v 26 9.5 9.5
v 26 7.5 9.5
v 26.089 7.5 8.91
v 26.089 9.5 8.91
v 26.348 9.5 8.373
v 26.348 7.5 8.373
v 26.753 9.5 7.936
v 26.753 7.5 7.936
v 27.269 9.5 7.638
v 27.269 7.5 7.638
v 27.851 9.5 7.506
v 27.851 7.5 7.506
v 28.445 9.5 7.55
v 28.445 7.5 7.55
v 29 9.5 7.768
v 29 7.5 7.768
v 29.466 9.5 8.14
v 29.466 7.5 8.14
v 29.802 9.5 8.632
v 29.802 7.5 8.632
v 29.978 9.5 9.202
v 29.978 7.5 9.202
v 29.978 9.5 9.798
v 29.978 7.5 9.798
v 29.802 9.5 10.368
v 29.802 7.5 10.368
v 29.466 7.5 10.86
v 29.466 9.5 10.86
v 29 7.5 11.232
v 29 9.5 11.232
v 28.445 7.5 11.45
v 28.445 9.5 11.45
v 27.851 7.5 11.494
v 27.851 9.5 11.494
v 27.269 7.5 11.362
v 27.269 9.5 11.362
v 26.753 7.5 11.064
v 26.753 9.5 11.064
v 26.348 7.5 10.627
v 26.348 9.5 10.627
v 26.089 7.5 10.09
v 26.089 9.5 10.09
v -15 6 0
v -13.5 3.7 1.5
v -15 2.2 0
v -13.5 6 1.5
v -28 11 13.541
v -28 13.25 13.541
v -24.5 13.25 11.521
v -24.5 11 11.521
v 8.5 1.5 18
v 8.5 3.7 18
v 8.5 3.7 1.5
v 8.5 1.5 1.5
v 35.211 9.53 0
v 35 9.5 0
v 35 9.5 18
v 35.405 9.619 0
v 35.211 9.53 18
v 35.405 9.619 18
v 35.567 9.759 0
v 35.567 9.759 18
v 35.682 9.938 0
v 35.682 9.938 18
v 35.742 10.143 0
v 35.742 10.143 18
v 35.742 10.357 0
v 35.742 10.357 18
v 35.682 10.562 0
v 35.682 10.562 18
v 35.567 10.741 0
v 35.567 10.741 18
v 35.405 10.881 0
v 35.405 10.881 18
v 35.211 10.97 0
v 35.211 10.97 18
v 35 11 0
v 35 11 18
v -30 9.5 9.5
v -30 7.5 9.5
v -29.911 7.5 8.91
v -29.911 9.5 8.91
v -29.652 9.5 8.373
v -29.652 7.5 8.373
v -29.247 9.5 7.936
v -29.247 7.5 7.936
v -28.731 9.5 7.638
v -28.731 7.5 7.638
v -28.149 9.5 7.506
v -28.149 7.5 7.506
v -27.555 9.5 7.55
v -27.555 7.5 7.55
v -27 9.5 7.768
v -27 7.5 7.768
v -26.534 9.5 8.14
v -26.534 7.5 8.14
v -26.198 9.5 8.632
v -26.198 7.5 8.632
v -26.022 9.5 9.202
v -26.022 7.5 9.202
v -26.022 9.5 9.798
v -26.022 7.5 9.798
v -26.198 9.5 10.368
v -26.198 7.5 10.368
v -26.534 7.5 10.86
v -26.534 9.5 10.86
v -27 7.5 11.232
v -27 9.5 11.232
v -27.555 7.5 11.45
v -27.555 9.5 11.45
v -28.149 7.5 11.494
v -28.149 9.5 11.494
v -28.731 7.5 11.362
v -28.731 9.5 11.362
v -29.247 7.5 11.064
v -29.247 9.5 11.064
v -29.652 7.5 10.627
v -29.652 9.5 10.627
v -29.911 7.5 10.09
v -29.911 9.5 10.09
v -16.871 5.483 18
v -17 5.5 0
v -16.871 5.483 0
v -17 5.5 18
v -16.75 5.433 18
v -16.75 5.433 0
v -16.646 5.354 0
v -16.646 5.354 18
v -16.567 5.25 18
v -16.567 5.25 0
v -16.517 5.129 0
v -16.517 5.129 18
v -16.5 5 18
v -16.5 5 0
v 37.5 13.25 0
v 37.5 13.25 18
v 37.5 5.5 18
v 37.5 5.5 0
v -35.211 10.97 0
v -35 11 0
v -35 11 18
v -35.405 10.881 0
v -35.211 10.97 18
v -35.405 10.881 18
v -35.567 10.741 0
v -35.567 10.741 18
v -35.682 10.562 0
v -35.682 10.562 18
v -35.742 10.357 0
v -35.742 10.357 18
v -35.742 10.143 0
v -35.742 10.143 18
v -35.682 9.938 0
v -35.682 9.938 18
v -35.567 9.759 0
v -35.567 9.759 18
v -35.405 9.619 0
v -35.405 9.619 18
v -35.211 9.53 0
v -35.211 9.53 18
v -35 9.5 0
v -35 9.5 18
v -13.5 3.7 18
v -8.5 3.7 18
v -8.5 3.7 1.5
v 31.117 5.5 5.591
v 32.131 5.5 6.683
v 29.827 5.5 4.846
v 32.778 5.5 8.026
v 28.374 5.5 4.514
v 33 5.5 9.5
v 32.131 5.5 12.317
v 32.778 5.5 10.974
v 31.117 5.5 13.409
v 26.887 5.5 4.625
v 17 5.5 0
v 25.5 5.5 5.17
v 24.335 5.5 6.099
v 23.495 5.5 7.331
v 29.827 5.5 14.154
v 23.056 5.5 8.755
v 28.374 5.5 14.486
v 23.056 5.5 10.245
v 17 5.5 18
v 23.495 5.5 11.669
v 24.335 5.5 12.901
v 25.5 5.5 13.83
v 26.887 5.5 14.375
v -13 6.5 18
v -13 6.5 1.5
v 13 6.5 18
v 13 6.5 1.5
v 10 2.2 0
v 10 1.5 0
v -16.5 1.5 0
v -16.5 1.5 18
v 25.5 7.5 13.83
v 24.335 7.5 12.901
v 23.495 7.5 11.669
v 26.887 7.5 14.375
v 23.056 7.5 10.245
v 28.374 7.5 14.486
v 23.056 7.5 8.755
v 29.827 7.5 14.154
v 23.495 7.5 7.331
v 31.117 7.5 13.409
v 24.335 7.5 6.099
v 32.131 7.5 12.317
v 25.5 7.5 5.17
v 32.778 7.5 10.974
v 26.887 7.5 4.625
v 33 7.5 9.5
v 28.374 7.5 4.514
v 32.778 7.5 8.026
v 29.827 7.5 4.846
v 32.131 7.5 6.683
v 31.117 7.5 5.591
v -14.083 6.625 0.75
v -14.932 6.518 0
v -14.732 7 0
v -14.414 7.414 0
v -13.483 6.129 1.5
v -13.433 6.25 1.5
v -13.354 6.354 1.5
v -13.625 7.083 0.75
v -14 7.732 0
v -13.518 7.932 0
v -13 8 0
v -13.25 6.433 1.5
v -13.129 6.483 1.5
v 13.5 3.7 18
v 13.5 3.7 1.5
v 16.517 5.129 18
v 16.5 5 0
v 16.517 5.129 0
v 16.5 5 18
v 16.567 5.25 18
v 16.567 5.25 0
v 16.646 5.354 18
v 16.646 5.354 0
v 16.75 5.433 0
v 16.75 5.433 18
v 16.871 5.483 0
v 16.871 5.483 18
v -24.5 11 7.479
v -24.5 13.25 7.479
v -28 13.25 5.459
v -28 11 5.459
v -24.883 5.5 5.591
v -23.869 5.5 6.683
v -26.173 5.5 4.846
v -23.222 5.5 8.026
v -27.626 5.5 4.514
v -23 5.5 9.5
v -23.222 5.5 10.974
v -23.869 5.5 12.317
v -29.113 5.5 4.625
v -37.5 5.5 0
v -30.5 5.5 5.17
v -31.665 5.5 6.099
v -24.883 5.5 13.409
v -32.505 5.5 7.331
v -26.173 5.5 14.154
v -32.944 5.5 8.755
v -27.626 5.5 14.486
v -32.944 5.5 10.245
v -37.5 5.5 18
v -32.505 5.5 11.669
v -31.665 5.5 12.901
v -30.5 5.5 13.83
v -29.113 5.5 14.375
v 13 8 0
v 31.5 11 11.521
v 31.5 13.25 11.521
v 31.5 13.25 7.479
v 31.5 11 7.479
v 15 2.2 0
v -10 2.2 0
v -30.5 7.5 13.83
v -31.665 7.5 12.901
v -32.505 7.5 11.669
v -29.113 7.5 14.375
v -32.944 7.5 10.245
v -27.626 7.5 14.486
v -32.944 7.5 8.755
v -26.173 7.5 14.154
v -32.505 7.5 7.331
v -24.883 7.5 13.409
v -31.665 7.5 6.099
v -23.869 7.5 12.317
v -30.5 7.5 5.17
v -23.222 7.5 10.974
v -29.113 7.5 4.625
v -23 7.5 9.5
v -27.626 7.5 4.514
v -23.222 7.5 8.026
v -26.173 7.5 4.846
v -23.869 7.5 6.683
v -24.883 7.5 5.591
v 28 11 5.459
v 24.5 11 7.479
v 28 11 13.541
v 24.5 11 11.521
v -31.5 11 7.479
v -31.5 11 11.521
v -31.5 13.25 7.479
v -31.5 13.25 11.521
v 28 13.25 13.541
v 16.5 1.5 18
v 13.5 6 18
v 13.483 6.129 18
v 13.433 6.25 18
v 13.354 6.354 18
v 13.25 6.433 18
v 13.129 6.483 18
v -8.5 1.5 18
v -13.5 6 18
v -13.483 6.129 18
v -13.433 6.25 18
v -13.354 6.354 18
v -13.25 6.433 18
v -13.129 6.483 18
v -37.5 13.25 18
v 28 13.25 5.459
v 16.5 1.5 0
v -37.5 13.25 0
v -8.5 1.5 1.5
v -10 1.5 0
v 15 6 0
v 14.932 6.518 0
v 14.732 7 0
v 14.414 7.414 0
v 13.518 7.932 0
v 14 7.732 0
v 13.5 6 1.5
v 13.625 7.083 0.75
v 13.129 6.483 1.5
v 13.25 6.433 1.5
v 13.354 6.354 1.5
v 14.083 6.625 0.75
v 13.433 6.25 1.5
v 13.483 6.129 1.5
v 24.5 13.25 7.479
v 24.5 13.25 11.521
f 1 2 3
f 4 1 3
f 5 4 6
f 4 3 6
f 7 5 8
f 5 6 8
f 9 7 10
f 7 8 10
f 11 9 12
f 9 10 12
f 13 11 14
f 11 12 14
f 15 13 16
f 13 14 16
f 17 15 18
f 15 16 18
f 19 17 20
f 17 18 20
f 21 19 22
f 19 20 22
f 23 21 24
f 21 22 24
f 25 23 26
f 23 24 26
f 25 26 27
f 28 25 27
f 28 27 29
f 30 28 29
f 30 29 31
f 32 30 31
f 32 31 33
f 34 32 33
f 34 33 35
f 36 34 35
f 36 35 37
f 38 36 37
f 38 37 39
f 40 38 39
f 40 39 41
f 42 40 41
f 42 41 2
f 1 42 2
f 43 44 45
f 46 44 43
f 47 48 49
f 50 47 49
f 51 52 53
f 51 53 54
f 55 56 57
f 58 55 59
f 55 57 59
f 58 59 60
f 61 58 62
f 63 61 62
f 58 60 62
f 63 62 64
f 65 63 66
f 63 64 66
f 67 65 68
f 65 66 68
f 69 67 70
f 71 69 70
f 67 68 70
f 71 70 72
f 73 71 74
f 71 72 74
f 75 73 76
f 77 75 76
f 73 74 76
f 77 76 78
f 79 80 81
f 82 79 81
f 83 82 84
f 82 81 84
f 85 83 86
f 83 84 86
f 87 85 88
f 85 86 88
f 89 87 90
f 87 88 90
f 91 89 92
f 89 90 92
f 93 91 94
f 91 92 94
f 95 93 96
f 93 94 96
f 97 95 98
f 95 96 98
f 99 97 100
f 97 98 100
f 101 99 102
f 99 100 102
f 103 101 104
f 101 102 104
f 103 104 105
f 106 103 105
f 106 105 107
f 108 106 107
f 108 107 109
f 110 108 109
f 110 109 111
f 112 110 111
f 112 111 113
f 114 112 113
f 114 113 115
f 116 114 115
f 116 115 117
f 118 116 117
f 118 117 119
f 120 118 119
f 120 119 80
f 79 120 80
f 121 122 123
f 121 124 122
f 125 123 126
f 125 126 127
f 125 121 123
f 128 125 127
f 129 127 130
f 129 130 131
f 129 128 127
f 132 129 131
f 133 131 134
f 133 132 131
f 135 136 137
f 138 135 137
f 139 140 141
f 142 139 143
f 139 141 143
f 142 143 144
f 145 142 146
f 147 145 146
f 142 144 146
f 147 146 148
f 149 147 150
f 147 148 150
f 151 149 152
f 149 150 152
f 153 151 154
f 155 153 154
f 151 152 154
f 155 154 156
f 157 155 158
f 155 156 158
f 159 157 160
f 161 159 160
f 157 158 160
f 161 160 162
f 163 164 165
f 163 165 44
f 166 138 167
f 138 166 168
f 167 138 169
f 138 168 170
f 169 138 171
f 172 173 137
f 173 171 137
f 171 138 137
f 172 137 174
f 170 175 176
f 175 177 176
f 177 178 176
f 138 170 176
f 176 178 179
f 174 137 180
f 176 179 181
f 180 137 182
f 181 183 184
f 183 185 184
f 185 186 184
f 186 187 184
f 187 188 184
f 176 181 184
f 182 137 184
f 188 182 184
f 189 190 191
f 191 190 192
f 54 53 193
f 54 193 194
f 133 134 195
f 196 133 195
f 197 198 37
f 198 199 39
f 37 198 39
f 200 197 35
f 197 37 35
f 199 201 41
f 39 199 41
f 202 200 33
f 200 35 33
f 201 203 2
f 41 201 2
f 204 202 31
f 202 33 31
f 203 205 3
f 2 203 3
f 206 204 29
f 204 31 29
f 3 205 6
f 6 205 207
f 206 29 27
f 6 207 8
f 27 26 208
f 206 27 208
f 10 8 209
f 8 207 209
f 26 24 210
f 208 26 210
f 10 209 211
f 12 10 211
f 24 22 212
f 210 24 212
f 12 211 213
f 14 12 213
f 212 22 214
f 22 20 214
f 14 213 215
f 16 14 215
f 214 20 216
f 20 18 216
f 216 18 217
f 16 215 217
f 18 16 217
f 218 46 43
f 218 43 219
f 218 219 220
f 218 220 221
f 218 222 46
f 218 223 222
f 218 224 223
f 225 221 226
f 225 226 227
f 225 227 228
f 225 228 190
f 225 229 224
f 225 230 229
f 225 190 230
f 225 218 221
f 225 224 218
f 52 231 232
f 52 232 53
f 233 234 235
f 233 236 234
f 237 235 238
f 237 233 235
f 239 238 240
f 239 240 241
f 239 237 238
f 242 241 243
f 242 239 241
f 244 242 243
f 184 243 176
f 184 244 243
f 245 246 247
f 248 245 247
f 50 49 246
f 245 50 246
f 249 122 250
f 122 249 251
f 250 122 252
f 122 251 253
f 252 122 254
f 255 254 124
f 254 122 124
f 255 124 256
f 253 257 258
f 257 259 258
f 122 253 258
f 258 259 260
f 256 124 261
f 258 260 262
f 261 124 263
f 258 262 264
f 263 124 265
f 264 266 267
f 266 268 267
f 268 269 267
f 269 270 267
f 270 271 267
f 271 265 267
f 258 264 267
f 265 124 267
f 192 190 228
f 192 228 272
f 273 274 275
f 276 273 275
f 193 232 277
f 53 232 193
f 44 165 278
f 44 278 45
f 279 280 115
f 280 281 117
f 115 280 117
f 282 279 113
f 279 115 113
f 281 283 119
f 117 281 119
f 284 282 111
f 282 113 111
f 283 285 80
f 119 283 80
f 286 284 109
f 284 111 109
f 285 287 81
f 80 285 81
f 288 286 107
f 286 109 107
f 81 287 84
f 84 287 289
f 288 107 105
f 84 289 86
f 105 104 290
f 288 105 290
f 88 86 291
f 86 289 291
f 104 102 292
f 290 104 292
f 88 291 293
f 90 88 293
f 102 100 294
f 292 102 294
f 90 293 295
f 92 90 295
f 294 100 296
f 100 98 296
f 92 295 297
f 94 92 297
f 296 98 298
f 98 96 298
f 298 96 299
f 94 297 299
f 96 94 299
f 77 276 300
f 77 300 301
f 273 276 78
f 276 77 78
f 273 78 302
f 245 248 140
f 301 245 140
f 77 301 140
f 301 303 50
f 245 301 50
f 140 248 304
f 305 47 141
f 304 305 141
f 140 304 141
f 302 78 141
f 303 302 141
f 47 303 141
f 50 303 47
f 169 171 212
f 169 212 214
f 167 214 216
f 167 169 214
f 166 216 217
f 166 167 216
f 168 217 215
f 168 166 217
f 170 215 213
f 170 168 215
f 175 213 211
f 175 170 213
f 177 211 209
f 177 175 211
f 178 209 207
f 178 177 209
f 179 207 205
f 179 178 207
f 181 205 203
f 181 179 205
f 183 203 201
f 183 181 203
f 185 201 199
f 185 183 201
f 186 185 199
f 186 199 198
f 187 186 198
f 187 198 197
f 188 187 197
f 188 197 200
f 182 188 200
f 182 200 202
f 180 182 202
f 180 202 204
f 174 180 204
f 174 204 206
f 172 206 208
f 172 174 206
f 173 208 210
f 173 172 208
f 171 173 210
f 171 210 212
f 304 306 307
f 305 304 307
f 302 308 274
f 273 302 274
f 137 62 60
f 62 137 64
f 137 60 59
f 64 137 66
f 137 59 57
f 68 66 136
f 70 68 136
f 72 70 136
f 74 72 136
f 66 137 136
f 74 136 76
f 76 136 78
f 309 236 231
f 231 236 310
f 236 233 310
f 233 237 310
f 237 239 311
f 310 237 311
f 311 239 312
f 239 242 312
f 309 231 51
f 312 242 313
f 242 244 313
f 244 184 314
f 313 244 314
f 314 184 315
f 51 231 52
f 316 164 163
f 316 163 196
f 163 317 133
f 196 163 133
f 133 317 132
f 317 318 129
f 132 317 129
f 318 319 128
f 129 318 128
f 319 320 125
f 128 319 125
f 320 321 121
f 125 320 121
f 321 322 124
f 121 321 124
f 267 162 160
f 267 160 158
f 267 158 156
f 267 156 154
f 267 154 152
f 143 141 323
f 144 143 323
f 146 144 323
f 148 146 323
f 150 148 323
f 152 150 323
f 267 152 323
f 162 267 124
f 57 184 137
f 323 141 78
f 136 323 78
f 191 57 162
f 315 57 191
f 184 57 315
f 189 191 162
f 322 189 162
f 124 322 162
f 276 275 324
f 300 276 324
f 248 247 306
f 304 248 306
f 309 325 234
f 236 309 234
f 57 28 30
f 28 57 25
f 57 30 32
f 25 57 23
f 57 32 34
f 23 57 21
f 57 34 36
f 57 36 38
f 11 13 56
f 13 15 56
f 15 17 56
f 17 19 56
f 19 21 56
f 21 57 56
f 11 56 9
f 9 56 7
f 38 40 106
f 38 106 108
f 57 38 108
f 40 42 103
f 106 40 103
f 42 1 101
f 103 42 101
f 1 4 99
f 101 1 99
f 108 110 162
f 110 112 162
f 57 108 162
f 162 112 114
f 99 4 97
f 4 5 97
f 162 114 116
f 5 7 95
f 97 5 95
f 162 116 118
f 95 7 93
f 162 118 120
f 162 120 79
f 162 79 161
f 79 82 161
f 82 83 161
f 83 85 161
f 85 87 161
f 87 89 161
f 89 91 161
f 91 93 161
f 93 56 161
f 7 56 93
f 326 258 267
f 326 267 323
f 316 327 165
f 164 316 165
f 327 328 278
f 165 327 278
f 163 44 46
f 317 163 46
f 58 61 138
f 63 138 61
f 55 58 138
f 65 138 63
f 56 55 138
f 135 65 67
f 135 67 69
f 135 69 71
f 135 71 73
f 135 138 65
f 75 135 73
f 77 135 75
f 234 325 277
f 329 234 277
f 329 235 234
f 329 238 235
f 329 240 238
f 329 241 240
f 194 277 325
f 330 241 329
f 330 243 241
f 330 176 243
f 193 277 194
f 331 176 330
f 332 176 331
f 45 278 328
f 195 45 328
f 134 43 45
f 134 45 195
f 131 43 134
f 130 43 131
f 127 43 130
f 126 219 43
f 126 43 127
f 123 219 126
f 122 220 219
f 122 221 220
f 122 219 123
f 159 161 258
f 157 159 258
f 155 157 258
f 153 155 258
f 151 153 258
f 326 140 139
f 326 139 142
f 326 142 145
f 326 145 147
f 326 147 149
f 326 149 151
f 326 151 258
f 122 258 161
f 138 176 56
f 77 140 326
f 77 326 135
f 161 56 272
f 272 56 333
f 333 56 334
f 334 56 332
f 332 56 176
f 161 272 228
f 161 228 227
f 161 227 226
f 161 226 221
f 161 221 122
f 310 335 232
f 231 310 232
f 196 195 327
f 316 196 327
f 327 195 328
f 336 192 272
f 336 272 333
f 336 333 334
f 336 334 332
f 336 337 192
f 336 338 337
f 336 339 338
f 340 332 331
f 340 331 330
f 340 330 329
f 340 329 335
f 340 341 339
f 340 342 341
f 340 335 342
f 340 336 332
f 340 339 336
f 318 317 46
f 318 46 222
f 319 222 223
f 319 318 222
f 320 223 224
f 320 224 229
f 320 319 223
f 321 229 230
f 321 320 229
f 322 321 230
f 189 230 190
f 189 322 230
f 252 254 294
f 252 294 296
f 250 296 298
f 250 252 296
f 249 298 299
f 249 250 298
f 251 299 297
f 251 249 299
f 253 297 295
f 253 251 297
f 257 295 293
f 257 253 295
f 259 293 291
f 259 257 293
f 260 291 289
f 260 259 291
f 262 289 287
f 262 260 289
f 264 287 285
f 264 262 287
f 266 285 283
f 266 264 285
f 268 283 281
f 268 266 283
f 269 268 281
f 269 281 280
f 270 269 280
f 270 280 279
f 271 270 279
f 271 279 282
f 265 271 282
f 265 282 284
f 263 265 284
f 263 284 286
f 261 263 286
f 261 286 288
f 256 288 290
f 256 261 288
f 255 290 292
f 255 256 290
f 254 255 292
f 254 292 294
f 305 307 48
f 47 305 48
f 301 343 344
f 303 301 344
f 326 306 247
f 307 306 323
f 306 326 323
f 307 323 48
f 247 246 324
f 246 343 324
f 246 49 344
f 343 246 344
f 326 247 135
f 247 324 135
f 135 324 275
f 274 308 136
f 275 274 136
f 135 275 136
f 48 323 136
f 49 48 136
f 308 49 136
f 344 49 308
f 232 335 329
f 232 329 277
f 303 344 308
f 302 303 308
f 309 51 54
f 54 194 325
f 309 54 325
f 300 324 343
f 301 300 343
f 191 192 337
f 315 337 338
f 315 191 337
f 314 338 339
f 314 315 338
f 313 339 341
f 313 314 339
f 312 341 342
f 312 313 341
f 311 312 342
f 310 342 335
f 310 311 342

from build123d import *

# Parameters (mm, degrees)
DODANIE_WYCI_GNI_CIE1_DEPTH = 18
WYTNIJ_WYCI_GNI_CIE1_START  = -4
SZKIC4_R                    = 5
WYTNIJ_WYCI_GNI_CIE1_DEPTH  = 2
SZKIC5_R                    = 2
WYTNIJ_WYCI_GNI_CIE2_DEPTH  = 2.653427208
ZAOKR_GLENIE1_R             = 0.5
DODANIE_WYCI_GNI_CIE2_DEPTH = 18
WYTNIJ_WYCI_GNI_CIE3_REACH  = 13.75
SFAZOWANIE1_SIZE            = 1.5


with BuildPart() as part:
    # Szkic1 → Dodanie-wyciągnięcie1 (new body)
    with BuildSketch(Plane.XY):
        Polygon((-13.5, 3.7), (-13.5, 6.5), (13.5, 6.5), (13.5, 3.7), (8.5, 3.7), (8.5, 1.5), (16.5, 1.5), (16.5, 5.5), (35, 5.5), (35, 9.5), (-35, 9.5), (-35, 5.5), (-16.5, 5.5), (-16.5, 1.5), (-8.5, 1.5), (-8.5, 3.7), align=None)
    extrude(amount=DODANIE_WYCI_GNI_CIE1_DEPTH)

    # Szkic4 → Wytnij-wyciągnięcie1 (cut)
    with BuildSketch(Plane(origin=(0, 9.5, 0), x_dir=(1, 0, 0), z_dir=(0, 1, 0)).offset(WYTNIJ_WYCI_GNI_CIE1_START)):
        with Locations((-28, -9.5)):
            Circle(SZKIC4_R)
        with Locations((28, -9.5)):
            Circle(SZKIC4_R)
    extrude(amount=WYTNIJ_WYCI_GNI_CIE1_DEPTH, mode=Mode.SUBTRACT)

    # Szkic5 → Wytnij-wyciągnięcie2 (cut)
    with BuildSketch(Plane(origin=(0, 7.5, 0), x_dir=(-1, 0, 0), z_dir=(0, -1, 0))):
        with Locations((28, -9.5)):
            Circle(SZKIC5_R)
        with Locations((-28, -9.5)):
            Circle(SZKIC5_R)
    extrude(amount=-WYTNIJ_WYCI_GNI_CIE2_DEPTH, mode=Mode.SUBTRACT)

    # Zaokrąglenie1
    zaokr_glenie1_edges = [part.edges().sort_by_distance(p)[0] for p in [
        (-16.5, 5.5, 9),
        (16.5, 5.5, 9),
        (13.5, 6.5, 9),
        (-13.5, 6.5, 9),
    ]]
    fillet(zaokr_glenie1_edges, radius=ZAOKR_GLENIE1_R)

    # Szkic6 → Dodanie-wyciągnięcie2 (add)
    with BuildSketch(Plane.XY.offset(18)):
        with BuildLine():
            Line((35, 11), (-35, 11))
            ThreePointArc((-35, 11), (-35.75, 10.25), (-35, 9.5))
            Line((-35, 9.5), (-35, 5.5))
            Line((-35, 5.5), (-37.5, 5.5))
            Line((-37.5, 5.5), (-37.5, 13.25))
            Line((-37.5, 13.25), (37.5, 13.25))
            Line((37.5, 13.25), (37.5, 5.5))
            Line((37.5, 5.5), (35, 5.5))
            Line((35, 5.5), (35, 9.5))
            ThreePointArc((35, 9.5), (35.75, 10.25), (35, 11))
        make_face()
    extrude(amount=-DODANIE_WYCI_GNI_CIE2_DEPTH)

    # Szkic7 → Wytnij-wyciągnięcie3 (cut, up to next)
    with BuildSketch(Plane(origin=(0, 13.25, 0), x_dir=(1, 0, 0), z_dir=(0, 1, 0)), mode=Mode.PRIVATE) as wytnij_wyci_gni_cie3_sk1:
        Polygon((-31.5, -7.479274058), (-31.5, -11.520725942), (-28, -13.541451884), (-24.5, -11.520725942), (-24.5, -7.479274058), (-28, -5.458548116), align=None)
    wytnij_wyci_gni_cie3_tool1 = extrude(wytnij_wyci_gni_cie3_sk1.sketch, amount=-WYTNIJ_WYCI_GNI_CIE3_REACH, mode=Mode.PRIVATE) & part.part
    add(wytnij_wyci_gni_cie3_tool1.solids().sort_by_distance((-28, 13.25, 9.5))[0], mode=Mode.SUBTRACT)
    # Szkic7 → Wytnij-wyciągnięcie3 (cut, up to next)
    with BuildSketch(Plane(origin=(0, 13.25, 0), x_dir=(1, 0, 0), z_dir=(0, 1, 0)), mode=Mode.PRIVATE) as wytnij_wyci_gni_cie3_sk2:
        Polygon((28, -5.458548116), (24.5, -7.479274058), (24.5, -11.520725942), (28, -13.541451884), (31.5, -11.520725942), (31.5, -7.479274058), align=None)
    wytnij_wyci_gni_cie3_tool2 = extrude(wytnij_wyci_gni_cie3_sk2.sketch, amount=-WYTNIJ_WYCI_GNI_CIE3_REACH, mode=Mode.PRIVATE) & part.part
    add(wytnij_wyci_gni_cie3_tool2.solids().sort_by_distance((28, 13.25, 9.5))[0], mode=Mode.SUBTRACT)

    # Sfazowanie1
    sfazowanie1_edges = [part.edges().sort_by_distance(p)[0] for p in [
        (-8.5, 2.6, 0),
        (8.5, 2.6, 0),
        (11, 3.7, 0),
        (-13.5, 4.85, 0),
        (-11, 3.7, 0),
        (0, 6.5, 0),
        (13.5, 4.85, 0),
        (-13.353553391, 6.353553391, 0),
        (13.353553391, 6.353553391, 0),
    ]]
    chamfer(sfazowanie1_edges, length=SFAZOWANIE1_SIZE)


solid = part.part
